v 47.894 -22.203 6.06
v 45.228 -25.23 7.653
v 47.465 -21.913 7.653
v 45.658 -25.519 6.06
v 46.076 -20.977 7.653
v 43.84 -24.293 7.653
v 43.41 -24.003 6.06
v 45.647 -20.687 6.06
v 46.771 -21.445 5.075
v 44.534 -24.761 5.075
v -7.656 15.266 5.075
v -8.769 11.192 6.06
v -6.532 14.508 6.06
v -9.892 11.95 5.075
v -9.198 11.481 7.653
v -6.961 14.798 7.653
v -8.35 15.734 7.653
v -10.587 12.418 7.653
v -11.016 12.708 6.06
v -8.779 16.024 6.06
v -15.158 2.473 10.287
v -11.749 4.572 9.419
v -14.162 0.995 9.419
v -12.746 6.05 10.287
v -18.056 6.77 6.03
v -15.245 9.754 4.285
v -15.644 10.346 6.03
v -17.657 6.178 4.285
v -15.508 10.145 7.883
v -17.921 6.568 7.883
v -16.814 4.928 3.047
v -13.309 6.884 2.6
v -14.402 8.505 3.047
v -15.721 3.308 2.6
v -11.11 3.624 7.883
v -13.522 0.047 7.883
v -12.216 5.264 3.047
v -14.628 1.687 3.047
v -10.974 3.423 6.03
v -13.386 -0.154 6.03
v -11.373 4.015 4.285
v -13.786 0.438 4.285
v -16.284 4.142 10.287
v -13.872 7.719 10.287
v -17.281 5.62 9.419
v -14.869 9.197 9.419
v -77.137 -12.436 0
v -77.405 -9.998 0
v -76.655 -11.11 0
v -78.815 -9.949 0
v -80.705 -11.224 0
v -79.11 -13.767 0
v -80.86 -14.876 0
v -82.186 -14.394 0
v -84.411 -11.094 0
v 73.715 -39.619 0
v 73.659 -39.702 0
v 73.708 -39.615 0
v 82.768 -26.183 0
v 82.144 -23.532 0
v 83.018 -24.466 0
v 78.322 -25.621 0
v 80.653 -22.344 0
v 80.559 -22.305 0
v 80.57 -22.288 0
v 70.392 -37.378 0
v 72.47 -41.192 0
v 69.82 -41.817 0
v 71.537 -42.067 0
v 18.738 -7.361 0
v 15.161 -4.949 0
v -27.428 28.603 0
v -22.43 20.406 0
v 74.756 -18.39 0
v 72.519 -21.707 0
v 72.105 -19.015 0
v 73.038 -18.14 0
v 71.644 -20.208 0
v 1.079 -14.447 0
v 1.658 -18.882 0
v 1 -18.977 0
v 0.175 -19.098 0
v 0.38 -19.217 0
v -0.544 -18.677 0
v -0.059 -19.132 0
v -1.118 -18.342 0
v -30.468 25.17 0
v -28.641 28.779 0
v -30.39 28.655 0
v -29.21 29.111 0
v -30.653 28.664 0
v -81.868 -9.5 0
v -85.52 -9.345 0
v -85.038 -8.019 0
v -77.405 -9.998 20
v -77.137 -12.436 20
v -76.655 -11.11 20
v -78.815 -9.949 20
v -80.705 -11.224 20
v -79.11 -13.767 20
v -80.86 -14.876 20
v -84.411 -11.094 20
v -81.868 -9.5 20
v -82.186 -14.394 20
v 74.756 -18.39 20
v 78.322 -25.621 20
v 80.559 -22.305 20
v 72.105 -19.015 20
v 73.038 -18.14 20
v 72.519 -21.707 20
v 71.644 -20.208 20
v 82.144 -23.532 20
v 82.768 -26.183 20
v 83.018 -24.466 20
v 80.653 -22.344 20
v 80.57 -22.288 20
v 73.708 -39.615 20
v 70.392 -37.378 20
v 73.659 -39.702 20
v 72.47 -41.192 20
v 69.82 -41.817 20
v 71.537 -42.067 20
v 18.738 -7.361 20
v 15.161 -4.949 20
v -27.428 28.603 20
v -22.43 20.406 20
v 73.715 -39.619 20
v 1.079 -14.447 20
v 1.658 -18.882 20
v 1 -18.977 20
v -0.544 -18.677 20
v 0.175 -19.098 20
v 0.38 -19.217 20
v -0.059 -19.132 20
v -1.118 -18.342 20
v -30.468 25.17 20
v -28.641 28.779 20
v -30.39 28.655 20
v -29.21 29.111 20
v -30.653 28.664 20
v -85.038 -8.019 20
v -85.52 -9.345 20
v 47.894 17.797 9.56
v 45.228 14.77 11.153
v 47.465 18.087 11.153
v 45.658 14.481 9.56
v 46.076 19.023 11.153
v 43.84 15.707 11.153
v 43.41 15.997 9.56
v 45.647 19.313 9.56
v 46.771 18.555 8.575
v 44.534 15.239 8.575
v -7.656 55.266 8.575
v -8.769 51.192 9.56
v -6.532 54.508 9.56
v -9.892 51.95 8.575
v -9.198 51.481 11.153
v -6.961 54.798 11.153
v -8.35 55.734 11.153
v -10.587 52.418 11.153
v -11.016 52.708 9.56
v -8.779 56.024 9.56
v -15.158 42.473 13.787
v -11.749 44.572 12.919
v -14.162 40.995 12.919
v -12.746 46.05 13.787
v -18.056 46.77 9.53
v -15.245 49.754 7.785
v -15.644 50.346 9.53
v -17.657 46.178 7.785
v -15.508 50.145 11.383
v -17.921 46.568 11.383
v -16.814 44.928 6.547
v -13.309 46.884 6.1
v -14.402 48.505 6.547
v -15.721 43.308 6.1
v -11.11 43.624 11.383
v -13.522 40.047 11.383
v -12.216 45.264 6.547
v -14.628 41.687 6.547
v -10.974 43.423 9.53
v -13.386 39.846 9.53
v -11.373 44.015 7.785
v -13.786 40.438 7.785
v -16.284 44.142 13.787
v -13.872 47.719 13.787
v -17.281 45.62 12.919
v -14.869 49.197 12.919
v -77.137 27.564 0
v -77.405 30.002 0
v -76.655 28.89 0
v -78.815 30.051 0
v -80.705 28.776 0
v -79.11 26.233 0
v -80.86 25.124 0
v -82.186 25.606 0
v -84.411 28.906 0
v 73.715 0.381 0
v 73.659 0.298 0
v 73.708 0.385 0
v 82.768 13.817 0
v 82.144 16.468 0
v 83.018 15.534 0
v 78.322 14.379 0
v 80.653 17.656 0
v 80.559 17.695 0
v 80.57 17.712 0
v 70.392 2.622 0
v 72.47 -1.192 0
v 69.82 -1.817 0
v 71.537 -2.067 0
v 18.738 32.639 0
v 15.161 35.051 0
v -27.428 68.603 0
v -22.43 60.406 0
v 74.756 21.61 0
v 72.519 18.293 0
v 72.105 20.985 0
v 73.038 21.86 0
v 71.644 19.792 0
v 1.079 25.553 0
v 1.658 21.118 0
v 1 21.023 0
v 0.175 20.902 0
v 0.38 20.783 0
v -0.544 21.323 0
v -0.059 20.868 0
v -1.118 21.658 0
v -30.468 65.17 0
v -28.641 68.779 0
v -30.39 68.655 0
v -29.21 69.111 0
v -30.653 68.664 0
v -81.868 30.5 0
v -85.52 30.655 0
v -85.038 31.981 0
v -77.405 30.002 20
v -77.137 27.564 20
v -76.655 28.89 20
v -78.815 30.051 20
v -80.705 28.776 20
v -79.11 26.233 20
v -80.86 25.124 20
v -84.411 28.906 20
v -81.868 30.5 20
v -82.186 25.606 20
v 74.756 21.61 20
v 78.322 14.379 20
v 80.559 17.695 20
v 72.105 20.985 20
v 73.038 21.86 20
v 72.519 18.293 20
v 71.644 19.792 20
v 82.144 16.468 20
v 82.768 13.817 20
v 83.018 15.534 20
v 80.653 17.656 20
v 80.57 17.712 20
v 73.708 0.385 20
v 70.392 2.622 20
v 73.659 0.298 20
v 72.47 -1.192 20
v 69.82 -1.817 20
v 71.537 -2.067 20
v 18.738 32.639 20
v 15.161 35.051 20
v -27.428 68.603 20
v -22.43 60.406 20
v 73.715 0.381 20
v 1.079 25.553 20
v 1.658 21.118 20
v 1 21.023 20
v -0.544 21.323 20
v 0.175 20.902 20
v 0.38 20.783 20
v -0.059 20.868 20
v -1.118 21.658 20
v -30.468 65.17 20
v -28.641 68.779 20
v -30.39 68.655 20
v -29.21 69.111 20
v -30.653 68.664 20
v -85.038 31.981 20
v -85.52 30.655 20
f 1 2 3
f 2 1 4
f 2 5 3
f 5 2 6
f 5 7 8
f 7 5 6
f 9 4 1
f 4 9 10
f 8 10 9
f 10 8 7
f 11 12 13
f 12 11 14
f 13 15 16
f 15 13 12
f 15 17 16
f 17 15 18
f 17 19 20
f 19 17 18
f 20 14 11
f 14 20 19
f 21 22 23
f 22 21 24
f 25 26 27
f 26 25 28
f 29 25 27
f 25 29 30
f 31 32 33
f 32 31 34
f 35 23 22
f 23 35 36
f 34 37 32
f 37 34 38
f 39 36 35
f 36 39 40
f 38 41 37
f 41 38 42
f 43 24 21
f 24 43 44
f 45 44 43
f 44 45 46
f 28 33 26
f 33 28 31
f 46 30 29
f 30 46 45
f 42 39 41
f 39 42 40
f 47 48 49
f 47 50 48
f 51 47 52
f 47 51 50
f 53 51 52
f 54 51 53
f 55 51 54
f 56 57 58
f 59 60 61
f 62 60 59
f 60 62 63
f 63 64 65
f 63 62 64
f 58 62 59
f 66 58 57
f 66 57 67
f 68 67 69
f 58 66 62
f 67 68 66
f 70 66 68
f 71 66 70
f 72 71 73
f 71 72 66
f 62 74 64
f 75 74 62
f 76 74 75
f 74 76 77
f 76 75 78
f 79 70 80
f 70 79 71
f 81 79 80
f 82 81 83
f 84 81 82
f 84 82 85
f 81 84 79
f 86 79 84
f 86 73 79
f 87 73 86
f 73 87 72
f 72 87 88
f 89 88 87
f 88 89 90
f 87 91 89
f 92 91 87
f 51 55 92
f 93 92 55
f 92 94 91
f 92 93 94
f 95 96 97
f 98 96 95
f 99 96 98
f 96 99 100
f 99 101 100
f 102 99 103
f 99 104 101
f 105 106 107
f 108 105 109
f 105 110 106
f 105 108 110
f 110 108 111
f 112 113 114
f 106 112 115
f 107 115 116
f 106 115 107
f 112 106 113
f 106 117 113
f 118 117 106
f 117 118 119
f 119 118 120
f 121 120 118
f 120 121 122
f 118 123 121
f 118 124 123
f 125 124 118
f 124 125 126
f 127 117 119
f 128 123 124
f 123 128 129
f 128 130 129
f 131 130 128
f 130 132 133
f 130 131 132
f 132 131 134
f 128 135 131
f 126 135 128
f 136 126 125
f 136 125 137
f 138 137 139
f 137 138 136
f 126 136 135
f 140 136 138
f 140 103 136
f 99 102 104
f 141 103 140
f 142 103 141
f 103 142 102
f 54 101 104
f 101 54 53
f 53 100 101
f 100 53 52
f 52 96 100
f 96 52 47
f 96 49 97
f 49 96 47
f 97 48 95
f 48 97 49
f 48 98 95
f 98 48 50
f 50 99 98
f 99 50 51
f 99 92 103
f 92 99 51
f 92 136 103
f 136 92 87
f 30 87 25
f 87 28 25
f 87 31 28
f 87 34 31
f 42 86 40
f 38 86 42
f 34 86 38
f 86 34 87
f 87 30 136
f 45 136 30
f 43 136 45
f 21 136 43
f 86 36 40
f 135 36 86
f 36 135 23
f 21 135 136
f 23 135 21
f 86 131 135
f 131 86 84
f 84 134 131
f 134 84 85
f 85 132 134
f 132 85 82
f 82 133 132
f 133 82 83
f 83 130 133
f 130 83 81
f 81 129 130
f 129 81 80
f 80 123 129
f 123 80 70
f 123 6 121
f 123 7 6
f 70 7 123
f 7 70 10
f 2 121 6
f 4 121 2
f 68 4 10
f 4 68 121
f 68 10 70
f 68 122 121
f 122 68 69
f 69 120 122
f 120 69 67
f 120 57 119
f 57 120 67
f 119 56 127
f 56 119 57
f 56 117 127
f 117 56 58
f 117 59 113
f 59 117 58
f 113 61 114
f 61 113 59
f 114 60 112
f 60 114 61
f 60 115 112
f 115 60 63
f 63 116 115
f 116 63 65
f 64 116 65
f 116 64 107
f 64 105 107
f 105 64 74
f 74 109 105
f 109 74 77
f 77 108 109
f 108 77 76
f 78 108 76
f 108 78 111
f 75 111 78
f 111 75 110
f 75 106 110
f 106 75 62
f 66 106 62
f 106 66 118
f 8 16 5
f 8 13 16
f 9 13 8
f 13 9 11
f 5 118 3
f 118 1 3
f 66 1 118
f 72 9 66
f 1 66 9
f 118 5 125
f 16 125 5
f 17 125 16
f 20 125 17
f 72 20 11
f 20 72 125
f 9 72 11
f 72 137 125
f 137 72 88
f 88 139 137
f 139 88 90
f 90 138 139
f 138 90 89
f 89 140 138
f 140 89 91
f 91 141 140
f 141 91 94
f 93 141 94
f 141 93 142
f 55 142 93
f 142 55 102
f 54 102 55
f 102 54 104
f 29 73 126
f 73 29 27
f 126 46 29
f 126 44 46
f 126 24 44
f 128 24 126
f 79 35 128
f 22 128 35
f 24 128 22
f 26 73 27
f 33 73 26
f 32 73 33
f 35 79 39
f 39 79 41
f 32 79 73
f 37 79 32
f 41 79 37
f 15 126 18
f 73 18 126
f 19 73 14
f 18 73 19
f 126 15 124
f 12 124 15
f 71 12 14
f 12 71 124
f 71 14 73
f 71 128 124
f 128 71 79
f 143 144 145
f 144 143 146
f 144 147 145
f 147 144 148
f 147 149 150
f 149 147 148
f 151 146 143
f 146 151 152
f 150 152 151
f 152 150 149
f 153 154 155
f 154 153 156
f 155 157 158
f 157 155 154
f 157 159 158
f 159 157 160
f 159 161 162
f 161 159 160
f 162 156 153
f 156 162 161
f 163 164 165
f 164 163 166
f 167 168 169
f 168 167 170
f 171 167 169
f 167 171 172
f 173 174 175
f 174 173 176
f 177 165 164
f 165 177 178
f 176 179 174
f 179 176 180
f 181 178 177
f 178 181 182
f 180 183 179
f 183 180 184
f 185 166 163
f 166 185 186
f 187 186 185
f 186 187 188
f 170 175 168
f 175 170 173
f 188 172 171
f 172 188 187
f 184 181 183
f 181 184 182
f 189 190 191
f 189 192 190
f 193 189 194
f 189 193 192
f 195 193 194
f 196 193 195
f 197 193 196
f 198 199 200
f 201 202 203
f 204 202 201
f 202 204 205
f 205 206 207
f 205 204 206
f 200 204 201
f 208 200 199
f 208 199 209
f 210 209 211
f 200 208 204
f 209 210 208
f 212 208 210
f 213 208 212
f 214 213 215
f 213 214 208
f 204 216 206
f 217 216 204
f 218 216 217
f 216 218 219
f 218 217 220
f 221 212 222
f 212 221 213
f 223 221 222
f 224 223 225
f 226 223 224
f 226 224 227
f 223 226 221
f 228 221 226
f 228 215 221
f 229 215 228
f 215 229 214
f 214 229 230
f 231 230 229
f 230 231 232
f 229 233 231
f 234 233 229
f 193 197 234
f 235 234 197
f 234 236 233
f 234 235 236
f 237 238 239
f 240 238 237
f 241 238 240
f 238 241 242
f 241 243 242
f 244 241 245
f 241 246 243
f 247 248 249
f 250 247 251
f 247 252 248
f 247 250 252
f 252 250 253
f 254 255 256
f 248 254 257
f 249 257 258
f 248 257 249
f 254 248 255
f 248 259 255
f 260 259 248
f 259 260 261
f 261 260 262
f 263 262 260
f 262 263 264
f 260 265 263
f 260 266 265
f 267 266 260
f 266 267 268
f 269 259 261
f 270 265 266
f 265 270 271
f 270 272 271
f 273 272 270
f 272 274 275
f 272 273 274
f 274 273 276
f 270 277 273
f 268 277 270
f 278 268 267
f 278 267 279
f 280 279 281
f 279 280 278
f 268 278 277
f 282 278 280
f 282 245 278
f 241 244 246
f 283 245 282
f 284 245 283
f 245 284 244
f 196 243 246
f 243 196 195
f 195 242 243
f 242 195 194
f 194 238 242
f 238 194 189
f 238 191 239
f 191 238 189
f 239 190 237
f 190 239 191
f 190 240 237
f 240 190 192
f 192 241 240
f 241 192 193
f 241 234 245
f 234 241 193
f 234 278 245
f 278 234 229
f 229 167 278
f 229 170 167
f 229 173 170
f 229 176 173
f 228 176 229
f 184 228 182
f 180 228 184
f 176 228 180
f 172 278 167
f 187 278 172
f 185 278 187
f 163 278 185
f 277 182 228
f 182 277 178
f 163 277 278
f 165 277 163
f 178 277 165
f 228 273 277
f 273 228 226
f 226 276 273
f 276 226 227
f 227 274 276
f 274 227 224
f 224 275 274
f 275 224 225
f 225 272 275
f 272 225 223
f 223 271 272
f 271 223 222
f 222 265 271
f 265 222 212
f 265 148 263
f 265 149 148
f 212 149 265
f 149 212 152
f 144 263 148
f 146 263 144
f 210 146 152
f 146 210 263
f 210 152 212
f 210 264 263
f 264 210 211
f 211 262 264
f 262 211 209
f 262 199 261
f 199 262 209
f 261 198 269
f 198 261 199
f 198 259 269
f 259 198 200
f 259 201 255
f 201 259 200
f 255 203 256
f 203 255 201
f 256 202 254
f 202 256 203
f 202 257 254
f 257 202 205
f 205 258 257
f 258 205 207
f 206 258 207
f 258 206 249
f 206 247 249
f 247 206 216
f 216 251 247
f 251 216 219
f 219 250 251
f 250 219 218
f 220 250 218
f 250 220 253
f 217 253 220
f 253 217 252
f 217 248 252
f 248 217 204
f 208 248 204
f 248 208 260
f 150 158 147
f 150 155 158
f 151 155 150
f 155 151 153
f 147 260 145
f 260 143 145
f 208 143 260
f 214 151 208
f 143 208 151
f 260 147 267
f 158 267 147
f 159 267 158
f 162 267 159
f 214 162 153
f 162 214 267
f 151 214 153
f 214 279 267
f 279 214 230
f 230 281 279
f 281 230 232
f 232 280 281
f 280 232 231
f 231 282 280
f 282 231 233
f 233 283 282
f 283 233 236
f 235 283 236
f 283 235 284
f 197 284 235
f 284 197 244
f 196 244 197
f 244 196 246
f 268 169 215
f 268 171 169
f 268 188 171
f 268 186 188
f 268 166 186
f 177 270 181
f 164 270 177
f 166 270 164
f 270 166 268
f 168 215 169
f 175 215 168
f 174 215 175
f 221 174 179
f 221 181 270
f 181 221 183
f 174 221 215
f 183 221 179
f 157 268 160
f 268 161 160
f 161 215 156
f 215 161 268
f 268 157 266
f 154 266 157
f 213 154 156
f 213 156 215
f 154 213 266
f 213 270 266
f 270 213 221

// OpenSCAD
// file: MCADlocal/2Dshapes.scad
/*
 *  OpenSCAD 2D Shapes Library (www.openscad.org)
 *  Copyright (C) 2012 Peter Uithoven
 *
 *  License: LGPL 2.1 or later
*/

// 2D Shapes
//ngon(sides, radius, center=false);
//complexRoundSquare(size,rads1=[0,0], rads2=[0,0], rads3=[0,0], rads4=[0,0], center=true)
//roundedSquare(pos=[10,10],r=2)
//ellipsePart(width,height,numQuarters)
//donutSlice(innerSize,outerSize, start_angle, end_angle) 
//pieSlice(size, start_angle, end_angle) //size in radius(es)
//ellipse(width, height) {

// Examples
/*use <layouts.scad>;
grid(105,105,true,4)
{
	// ellipse
	ellipse(50,75);

	// part of ellipse (a number of quarters)
	ellipsePart(50,75,3);
	ellipsePart(50,75,2);
	ellipsePart(50,75,1);

	// complexRoundSquare examples
	complexRoundSquare([75,100],[20,10],[20,10],[20,10],[20,10]);
	complexRoundSquare([75,100],[0,0],[0,0],[30,50],[20,10]);
	complexRoundSquare([50,50],[10,20],[10,20],[10,20],[10,20],false);
	complexRoundSquare([100,100]);
	complexRoundSquare([100,100],rads1=[20,20],rads3=[20,20]);

	// pie slice
	pieSlice(50,0,10);
	pieSlice(50,45,190);
	pieSlice([50,20],180,270);

	// donut slice
	donutSlice(20,50,0,350);
	donutSlice(30,50,190,270);
	donutSlice([40,22],[50,30],180,270);
	donutSlice([50,20],50,180,270);
	donutSlice([20,30],[50,40],0,270);
}*/
//----------------------

// size, top left radius, top right radius, bottom right radius, bottom left radius, center
module complexRoundSquare(size,rads1=[0,0], rads2=[0,0], rads3=[0,0], rads4=[0,0], center=true)
{
	width = size[0];
	height = size[1];
	//%square(size=[width, height],center=true);
	x1 = 0-width/2+rads1[0];
	y1 = 0-height/2+rads1[1];
	x2 = width/2-rads2[0];
	y2 = 0-height/2+rads2[1];
	x3 = width/2-rads3[0];
	y3 = height/2-rads3[1];
	x4 = 0-width/2+rads4[0];
	y4 = height/2-rads4[1];

	scs = 0.1; //straight corner size

	x = (center)? 0: width/2;
	y = (center)? 0: height/2;

	translate([x,y,0])
	{
		hull() {
			// top left
			if(rads1[0] > 0 && rads1[1] > 0)
				translate([x1,y1]) mirror([1,0])		ellipsePart(rads1[0]*2,rads1[1]*2,1);
			else 
				translate([x1,y1]) 						square(size=[scs, scs]);
			
			// top right
			if(rads2[0] > 0 && rads2[1] > 0)
				translate([x2,y2]) 						ellipsePart(rads2[0]*2,rads2[1]*2,1);	
			else 
				translate([width/2-scs,0-height/2]) 	square(size=[scs, scs]);

			// bottom right
			if(rads3[0] > 0 && rads3[1] > 0)
				translate([x3,y3]) mirror([0,1]) 		ellipsePart(rads3[0]*2,rads3[1]*2,1);
			else 
				translate([width/2-scs,height/2-scs]) 	square(size=[scs, scs]);
			
			// bottom left
			if(rads4[0] > 0 && rads4[1] > 0)
				translate([x4,y4]) rotate([0,0,-180]) 	ellipsePart(rads4[0]*2,rads4[1]*2,1);
			else 
				#translate([x4,height/2-scs]) 	square(size=[scs, scs]);
		}
	}
}
module roundedSquare(pos=[10,10],r=2, $fn=0) {
	minkowski() {
		square([pos[0]-r*2,pos[1]-r*2],center=true);
		circle(r=r, $fn=$fn);
	}
}
// round shapes
// The orientation might change with the implementation of circle...
module ngon(sides, radius, center=false){
    rotate([0, 0, 360/sides/2]) circle(r=radius, $fn=sides, center=center);
}
module ellipsePart(width,height,numQuarters)
{
    o = 1; //slight overlap to fix a bug
	difference()
	{
		ellipse(width,height);
		if(numQuarters <= 3)
			translate([0-width/2-o,0-height/2-o,0]) square([width/2+o,height/2+o]);
		if(numQuarters <= 2)
			translate([0-width/2-o,-o,0]) square([width/2+o,height/2+o*2]);
		if(numQuarters < 2)
			translate([-o,0,0]) square([width/2+o*2,height/2+o]);
	}
}
module donutSlice(innerSize,outerSize, start_angle, end_angle) 
{   
    difference()
    {
        pieSlice(outerSize, start_angle, end_angle);
        if(len(innerSize) > 1) ellipse(innerSize[0]*2,innerSize[1]*2);
        else circle(innerSize);
    }
}
module pieSlice(size, start_angle, end_angle) //size in radius(es)
{	
    rx = ((len(size) > 1)? size[0] : size);
    ry = ((len(size) > 1)? size[1] : size);
    trx = rx* sqrt(2) + 1;
    try = ry* sqrt(2) + 1;
    a0 = (4 * start_angle + 0 * end_angle) / 4;
    a1 = (3 * start_angle + 1 * end_angle) / 4;
    a2 = (2 * start_angle + 2 * end_angle) / 4;
    a3 = (1 * start_angle + 3 * end_angle) / 4;
    a4 = (0 * start_angle + 4 * end_angle) / 4;
    if(end_angle > start_angle)
        intersection() {
		if(len(size) > 1)
        	ellipse(rx*2,ry*2);
		else
			circle(rx);
        polygon([
            [0,0],
            [trx * cos(a0), try * sin(a0)],
            [trx * cos(a1), try * sin(a1)],
            [trx * cos(a2), try * sin(a2)],
            [trx * cos(a3), try * sin(a3)],
            [trx * cos(a4), try * sin(a4)],
            [0,0]
       ]);
    }
}
module ellipse(width, height) {
  scale([1, height/width, 1]) circle(r=width/2);
}
// main file
////////////////////////////////////////////////////////////////////////
// Initial Revision:
//   24-Mar-2016 
//
// Author:
//
//   David Crook <dpcrook@users.noreply.github.com>
//
// Inspired by:
//
//  Multiple
//
// Description:
//
//
//
// Revisions/Notes:
//
//   v1:
//   - 
//
////////////////////////////////////////////////////////////////////////


// use <ruler.scad>
// use <MCAD/shapes.scad>
use <MCADlocal/2Dshapes.scad>

// small number
//e=0.02;
e=0.02;

module displayCover() {
    import("files/Front.stl");
}

module raspiCover() {
    import("files/Back.stl");
}

module mountBrace() {
    import("files/7-inch-raspberry-pi-stand-wide-hole.stl");
}

module exampleBrace() {
    import("files/MCTouch_Holder.STL");
}


SLOPE_ANGLE = 90 - 68;
BRACKET_WIDTH = 20;

module myBrace(brace_width, drill_hole_offset) {
    
  braceWidth = brace_width;
  slopeAngle = SLOPE_ANGLE;

  ////////////////////////////////////////////////////////////////////////
  // Some Constants
  ////////////////////////////////////////////////////////////////////////
  startOrigin = [0,0,0];
  slopeRotationAngle = 180 + slopeAngle;
  slopeUnderhangAngleOrigin =  slopeRotationAngle + 90;
  slopeLipAngleOrigin =  slopeRotationAngle + 180;
  
  braceFrontThickness = 4;
  slopeThickness = 4;
  crossbarThickness = 3;

  frontRounded_r = braceFrontThickness / 2;
  crossbarRounded_r = crossbarThickness/2.5;
  slopeRounded_r = slopeThickness/2;
    
  slopeInsideLength = 120; // MEASURED: 119.0 mm
  againstFrontLength = (1/2) * cos(slopeAngle) * (slopeInsideLength + braceFrontThickness) ;
  
  crossbarInsideLength = 62;
  crossbarOverhangInsideLength = 2.1; // MEASURED on other brace: 2.0 mm
  crossbarLipInsideLength = 3.5;
  
  slopeUnderhangInsideLength = 14.2; // MEASURED: 14.0 mm
  slopeLipInsideLength = 5; 

  ////////////////////////////////////////////////////////////////////////
  // Some derived values
  ////////////////////////////////////////////////////////////////////////
  bracketOrigin = startOrigin + [0, braceFrontThickness, 0];
  bracketThickness = braceFrontThickness;
  bracketCrossbarLength = againstFrontLength * sin(slopeAngle) + slopeThickness * (1/cos(slopeAngle)) ;
  
  crossTopCorner = startOrigin + [0, againstFrontLength, 0];
  crossbarOrigin =  crossTopCorner + [crossbarThickness, -crossbarThickness, 0];
  crossbarTopLength = crossbarInsideLength + 2*crossbarThickness;

  crossbarOverhangOrigin =  crossbarOrigin + [crossbarThickness-crossbarTopLength,e,0];
  crossbarOverhangLength = crossbarOverhangInsideLength + crossbarThickness;

  crossbarLipOrigin =  crossbarOverhangOrigin + [-e, -crossbarOverhangInsideLength, 0];
  crossbarLipLength =  crossbarLipInsideLength;
  
  slopeTopCorner = crossTopCorner;
  slopeOrigin =  slopeTopCorner + [(braceFrontThickness-e)*cos(slopeAngle), 0, 0];
  slopeLength = slopeInsideLength + slopeThickness;

  slopeToUnderhangOriginLength = slopeLength - slopeThickness;
  slopeUnderhangOrigin =  slopeOrigin + [-e,0,0] +
    slopeToUnderhangOriginLength * [ cos(slopeUnderhangAngleOrigin), sin(slopeUnderhangAngleOrigin), 0] ;
  slopeUnderhangLength = slopeUnderhangInsideLength + slopeThickness + e; 
  
  slopeUnderhangToLipLength = slopeUnderhangLength - slopeThickness ;
  slopeLipOrigin = slopeUnderhangOrigin + 
    (slopeUnderhangToLipLength - e) * [ cos(slopeLipAngleOrigin), sin(slopeLipAngleOrigin), 0];
  slopeLipLength = slopeLipInsideLength + slopeThickness; 
  
  difference() {
    linear_extrude(height = braceWidth, center = false, convexity = 10)
      union() {

      //////////////////////////////////////////////////////////////////////////
      // Front of Lulzbot mini frame
      //////////////////////////////////////////////////////////////////////////
      translate(startOrigin)
        complexRoundSquare([braceFrontThickness, againstFrontLength],
                           [frontRounded_r, frontRounded_r],
                           [0,0],
                           [frontRounded_r, frontRounded_r],
                           [0,0],
                           center = false);

      translate(bracketOrigin) rotate ([0,0,270])
        complexRoundSquare([bracketThickness, bracketCrossbarLength],
                           [0,0],
                           [frontRounded_r, frontRounded_r],
                           [0,0],
                           [frontRounded_r, frontRounded_r],
                           center = false);
      
      //////////////////////////////////////////////////////////////////////////
      // Crossbar and rear attachment with lip
      //////////////////////////////////////////////////////////////////////////
      translate(crossbarOrigin) rotate ([0,0,90])
        complexRoundSquare([crossbarThickness, crossbarTopLength],
                           [0,0],
                           [crossbarRounded_r, crossbarRounded_r],
                           [crossbarRounded_r, crossbarRounded_r],
                           [0,0],
                           center = false);


      translate(crossbarOverhangOrigin) rotate ([0,0,180])
        complexRoundSquare([crossbarThickness, crossbarOverhangLength],
                           [0,0],
                           [0,0],
                           [crossbarRounded_r, crossbarRounded_r],
                           [0,0],
                           center = false);

      translate(crossbarLipOrigin) rotate ([0,0,270])
        complexRoundSquare([crossbarThickness, crossbarLipLength],
                           [0,0],
                           [0,0],
                           [crossbarRounded_r, crossbarRounded_r],
                           [crossbarRounded_r, crossbarRounded_r],
                           center = false);

      //////////////////////////////////////////////////////////////////////////
      // Sloped front for holding screen and attachment
      //////////////////////////////////////////////////////////////////////////      
      translate(slopeOrigin)
        rotate ([0, 0, slopeRotationAngle])
        complexRoundSquare([slopeThickness, slopeLength],
                           [slopeRounded_r, slopeRounded_r],
                           [0,0],
                           [slopeRounded_r, slopeRounded_r],
                           [0,0],
                           center = false);

      translate(slopeUnderhangOrigin) rotate ([0, 0, slopeUnderhangAngleOrigin])
        complexRoundSquare([slopeThickness, slopeUnderhangLength],
                           [0,0],
                           [0,0],
                           [slopeRounded_r, slopeRounded_r],
                           [0,0],
                           center = false);

      translate(slopeLipOrigin) rotate ([0, 0, slopeLipAngleOrigin])
        complexRoundSquare([slopeThickness, slopeLipLength],
                           [0,0],
                           [0,0],
                           [slopeRounded_r, slopeRounded_r],
                           [slopeRounded_r, slopeRounded_r],
                           center = false);
    
    }

    //////////////////////////////////////////////////////////////////////////
    // some math for screw holes placement
    //
    // Reference:
    //  - https://github.com/raspberrypi/documentation/raw/master/hardware/display/7InchDisplayDrawing-14092015.pdf
    //////////////////////////////////////////////////////////////////////////
    screwHoleDiameter = 2.85; // M3.0 screws
    screwHoleRadius = screwHoleDiameter/2; 
    screwHoleLength = slopeThickness + 2*e ;

    toolHoleDiameter = 7.8; // Driver bit
    toolHoleRadius = toolHoleDiameter /2 ; // Driver bit
    toolHoleLength = 5*braceFrontThickness + 2*e ;

    screwHoleSeparationInFrame = 65.65;
    screwTopHoleFromFrameEdge = 21.58;
    FrameEdgeToBezelEdge = 6.63;
    measuredDistanceFromUnderhangToBottomHole = 28.5;
    screwHolePlacementZHeight = drill_hole_offset;
    screwBottomHoleTranslation = [-e, slopeInsideLength - measuredDistanceFromUnderhangToBottomHole, screwHolePlacementZHeight];
    screwTopHoleTranslation = screwBottomHoleTranslation + [0, -screwHoleSeparationInFrame, 0];
    screwToolHoleTranslation = screwTopHoleTranslation + [screwHoleLength, 0, 0];

    translate(slopeOrigin)   rotate ([0, 0, slopeRotationAngle]) {
      union() {
        // drill two holes in slope
        translate(screwBottomHoleTranslation) rotate ([0, 90, 0])
          cylinder(h = screwHoleLength, r = screwHoleRadius, centered = true);
      
        translate(screwTopHoleTranslation) rotate ([0, 90, 0])
          cylinder(h = screwHoleLength, r = screwHoleRadius, centered = true);
      }
      // another hole for tool access in front of clamp
      translate(screwToolHoleTranslation) rotate ([0, 90, 0])
        cylinder(h = toolHoleLength, r = toolHoleRadius, centered = true);
    }
  }
  
}


module assemblyWithBraces(bracket_width, slope_angle, drill_offset_1, drill_offset_2) {

  a = slope_angle;

  drillHoleOffset1 = drill_offset_1;
  drillHoleOffset2 = drill_offset_2;
  
  displayX = 157.5;
  displayZ = 51;

  if (true) {
    color("White") translate([displayX,0,displayZ]) displayCover();
  } else {
    %translate([displayX,0,displayZ]) displayCover();
    }
  color("White") translate([displayX,0,displayZ]) raspiCover();

  // color("Red") translate([displayX - 3, 22, displayZ - 4])  rotate([0,90,0]) mountBrace();

  bracketWidth = bracket_width;
  bracketsXOffset =  43.5;
  bracketsYOffset =  29.5;
  bracketsZOffset =  120 - 52;

  drillHoleDelta = drillHoleOffset2 - drillHoleOffset1;
  
  translate([ bracketsXOffset      , bracketsYOffset, bracketsZOffset]) rotate([90, a, -90])
    myBrace(brace_width = bracketWidth, drill_hole_offset = drillHoleOffset1);
  translate([ bracketsXOffset + 126.2 + drillHoleDelta, bracketsYOffset, bracketsZOffset]) rotate([90, a, -90])
    myBrace(brace_width = bracketWidth, drill_hole_offset = drillHoleOffset2);
}

// Default behavior is to show printable double
printable = false;
printable = true;

printSingle = true;
printSingle = false;

printLeft = true;
printLeft = false;
printRight = !printLeft;

showAssembly = true;
showAssembly = false;

// animation settings for assembly
/// $vpt = [100, 10, 80];
/// $vpr = [90, 0, $t * 360 * 2];
/// $vpd = 800;

if (showAssembly) {
  bracket_width = BRACKET_WIDTH;
  drill_offset_1 = 6.5;
  drill_offset_2 = bracket_width/2;
  assemblyWithBraces(bracket_width = bracket_width, slope_angle = SLOPE_ANGLE,
                     drill_offset_1 = drill_offset_1, drill_offset_2 = drill_offset_2);
} else {
  if (printable)
  {
    // bed two braces (each with different drill hole center-width offsets)
    //  - need to print with supports since there are the drill holes
    bracket_width = BRACKET_WIDTH;
    bracket_bed_spacing = 40;
    bed_spacing_center = bracket_bed_spacing / 2;
    bed_rot_angle = (1/2)*(90 - SLOPE_ANGLE);

    if (! printSingle) {
      translate([0, -bed_spacing_center, 0])  rotate ([0, 0,  bed_rot_angle])
        myBrace(brace_width = 20, drill_hole_offset = 6.5);
      translate([0, +bed_spacing_center, 0])  rotate ([0, 0,  bed_rot_angle])
        myBrace(brace_width = 20, drill_hole_offset = bracket_width/2);
    } else {
      if (printLeft) {
        myBrace(brace_width = 20, drill_hole_offset = 6.5);
      } else {
        myBrace(brace_width = 20, drill_hole_offset = bracket_width/2);
      }
    }
  }
  else
  {
    bracket_width = BRACKET_WIDTH;

    // overlay on an example brace
    color("Green")  translate([0,0,0]) rotate([0,90,0]) exampleBrace(); 
    translate([64.5,21,00]) rotate([0,0,0])
      myBrace(brace_width = bracket_width, drill_hole_offset = bracket_width/2);
  }
}
